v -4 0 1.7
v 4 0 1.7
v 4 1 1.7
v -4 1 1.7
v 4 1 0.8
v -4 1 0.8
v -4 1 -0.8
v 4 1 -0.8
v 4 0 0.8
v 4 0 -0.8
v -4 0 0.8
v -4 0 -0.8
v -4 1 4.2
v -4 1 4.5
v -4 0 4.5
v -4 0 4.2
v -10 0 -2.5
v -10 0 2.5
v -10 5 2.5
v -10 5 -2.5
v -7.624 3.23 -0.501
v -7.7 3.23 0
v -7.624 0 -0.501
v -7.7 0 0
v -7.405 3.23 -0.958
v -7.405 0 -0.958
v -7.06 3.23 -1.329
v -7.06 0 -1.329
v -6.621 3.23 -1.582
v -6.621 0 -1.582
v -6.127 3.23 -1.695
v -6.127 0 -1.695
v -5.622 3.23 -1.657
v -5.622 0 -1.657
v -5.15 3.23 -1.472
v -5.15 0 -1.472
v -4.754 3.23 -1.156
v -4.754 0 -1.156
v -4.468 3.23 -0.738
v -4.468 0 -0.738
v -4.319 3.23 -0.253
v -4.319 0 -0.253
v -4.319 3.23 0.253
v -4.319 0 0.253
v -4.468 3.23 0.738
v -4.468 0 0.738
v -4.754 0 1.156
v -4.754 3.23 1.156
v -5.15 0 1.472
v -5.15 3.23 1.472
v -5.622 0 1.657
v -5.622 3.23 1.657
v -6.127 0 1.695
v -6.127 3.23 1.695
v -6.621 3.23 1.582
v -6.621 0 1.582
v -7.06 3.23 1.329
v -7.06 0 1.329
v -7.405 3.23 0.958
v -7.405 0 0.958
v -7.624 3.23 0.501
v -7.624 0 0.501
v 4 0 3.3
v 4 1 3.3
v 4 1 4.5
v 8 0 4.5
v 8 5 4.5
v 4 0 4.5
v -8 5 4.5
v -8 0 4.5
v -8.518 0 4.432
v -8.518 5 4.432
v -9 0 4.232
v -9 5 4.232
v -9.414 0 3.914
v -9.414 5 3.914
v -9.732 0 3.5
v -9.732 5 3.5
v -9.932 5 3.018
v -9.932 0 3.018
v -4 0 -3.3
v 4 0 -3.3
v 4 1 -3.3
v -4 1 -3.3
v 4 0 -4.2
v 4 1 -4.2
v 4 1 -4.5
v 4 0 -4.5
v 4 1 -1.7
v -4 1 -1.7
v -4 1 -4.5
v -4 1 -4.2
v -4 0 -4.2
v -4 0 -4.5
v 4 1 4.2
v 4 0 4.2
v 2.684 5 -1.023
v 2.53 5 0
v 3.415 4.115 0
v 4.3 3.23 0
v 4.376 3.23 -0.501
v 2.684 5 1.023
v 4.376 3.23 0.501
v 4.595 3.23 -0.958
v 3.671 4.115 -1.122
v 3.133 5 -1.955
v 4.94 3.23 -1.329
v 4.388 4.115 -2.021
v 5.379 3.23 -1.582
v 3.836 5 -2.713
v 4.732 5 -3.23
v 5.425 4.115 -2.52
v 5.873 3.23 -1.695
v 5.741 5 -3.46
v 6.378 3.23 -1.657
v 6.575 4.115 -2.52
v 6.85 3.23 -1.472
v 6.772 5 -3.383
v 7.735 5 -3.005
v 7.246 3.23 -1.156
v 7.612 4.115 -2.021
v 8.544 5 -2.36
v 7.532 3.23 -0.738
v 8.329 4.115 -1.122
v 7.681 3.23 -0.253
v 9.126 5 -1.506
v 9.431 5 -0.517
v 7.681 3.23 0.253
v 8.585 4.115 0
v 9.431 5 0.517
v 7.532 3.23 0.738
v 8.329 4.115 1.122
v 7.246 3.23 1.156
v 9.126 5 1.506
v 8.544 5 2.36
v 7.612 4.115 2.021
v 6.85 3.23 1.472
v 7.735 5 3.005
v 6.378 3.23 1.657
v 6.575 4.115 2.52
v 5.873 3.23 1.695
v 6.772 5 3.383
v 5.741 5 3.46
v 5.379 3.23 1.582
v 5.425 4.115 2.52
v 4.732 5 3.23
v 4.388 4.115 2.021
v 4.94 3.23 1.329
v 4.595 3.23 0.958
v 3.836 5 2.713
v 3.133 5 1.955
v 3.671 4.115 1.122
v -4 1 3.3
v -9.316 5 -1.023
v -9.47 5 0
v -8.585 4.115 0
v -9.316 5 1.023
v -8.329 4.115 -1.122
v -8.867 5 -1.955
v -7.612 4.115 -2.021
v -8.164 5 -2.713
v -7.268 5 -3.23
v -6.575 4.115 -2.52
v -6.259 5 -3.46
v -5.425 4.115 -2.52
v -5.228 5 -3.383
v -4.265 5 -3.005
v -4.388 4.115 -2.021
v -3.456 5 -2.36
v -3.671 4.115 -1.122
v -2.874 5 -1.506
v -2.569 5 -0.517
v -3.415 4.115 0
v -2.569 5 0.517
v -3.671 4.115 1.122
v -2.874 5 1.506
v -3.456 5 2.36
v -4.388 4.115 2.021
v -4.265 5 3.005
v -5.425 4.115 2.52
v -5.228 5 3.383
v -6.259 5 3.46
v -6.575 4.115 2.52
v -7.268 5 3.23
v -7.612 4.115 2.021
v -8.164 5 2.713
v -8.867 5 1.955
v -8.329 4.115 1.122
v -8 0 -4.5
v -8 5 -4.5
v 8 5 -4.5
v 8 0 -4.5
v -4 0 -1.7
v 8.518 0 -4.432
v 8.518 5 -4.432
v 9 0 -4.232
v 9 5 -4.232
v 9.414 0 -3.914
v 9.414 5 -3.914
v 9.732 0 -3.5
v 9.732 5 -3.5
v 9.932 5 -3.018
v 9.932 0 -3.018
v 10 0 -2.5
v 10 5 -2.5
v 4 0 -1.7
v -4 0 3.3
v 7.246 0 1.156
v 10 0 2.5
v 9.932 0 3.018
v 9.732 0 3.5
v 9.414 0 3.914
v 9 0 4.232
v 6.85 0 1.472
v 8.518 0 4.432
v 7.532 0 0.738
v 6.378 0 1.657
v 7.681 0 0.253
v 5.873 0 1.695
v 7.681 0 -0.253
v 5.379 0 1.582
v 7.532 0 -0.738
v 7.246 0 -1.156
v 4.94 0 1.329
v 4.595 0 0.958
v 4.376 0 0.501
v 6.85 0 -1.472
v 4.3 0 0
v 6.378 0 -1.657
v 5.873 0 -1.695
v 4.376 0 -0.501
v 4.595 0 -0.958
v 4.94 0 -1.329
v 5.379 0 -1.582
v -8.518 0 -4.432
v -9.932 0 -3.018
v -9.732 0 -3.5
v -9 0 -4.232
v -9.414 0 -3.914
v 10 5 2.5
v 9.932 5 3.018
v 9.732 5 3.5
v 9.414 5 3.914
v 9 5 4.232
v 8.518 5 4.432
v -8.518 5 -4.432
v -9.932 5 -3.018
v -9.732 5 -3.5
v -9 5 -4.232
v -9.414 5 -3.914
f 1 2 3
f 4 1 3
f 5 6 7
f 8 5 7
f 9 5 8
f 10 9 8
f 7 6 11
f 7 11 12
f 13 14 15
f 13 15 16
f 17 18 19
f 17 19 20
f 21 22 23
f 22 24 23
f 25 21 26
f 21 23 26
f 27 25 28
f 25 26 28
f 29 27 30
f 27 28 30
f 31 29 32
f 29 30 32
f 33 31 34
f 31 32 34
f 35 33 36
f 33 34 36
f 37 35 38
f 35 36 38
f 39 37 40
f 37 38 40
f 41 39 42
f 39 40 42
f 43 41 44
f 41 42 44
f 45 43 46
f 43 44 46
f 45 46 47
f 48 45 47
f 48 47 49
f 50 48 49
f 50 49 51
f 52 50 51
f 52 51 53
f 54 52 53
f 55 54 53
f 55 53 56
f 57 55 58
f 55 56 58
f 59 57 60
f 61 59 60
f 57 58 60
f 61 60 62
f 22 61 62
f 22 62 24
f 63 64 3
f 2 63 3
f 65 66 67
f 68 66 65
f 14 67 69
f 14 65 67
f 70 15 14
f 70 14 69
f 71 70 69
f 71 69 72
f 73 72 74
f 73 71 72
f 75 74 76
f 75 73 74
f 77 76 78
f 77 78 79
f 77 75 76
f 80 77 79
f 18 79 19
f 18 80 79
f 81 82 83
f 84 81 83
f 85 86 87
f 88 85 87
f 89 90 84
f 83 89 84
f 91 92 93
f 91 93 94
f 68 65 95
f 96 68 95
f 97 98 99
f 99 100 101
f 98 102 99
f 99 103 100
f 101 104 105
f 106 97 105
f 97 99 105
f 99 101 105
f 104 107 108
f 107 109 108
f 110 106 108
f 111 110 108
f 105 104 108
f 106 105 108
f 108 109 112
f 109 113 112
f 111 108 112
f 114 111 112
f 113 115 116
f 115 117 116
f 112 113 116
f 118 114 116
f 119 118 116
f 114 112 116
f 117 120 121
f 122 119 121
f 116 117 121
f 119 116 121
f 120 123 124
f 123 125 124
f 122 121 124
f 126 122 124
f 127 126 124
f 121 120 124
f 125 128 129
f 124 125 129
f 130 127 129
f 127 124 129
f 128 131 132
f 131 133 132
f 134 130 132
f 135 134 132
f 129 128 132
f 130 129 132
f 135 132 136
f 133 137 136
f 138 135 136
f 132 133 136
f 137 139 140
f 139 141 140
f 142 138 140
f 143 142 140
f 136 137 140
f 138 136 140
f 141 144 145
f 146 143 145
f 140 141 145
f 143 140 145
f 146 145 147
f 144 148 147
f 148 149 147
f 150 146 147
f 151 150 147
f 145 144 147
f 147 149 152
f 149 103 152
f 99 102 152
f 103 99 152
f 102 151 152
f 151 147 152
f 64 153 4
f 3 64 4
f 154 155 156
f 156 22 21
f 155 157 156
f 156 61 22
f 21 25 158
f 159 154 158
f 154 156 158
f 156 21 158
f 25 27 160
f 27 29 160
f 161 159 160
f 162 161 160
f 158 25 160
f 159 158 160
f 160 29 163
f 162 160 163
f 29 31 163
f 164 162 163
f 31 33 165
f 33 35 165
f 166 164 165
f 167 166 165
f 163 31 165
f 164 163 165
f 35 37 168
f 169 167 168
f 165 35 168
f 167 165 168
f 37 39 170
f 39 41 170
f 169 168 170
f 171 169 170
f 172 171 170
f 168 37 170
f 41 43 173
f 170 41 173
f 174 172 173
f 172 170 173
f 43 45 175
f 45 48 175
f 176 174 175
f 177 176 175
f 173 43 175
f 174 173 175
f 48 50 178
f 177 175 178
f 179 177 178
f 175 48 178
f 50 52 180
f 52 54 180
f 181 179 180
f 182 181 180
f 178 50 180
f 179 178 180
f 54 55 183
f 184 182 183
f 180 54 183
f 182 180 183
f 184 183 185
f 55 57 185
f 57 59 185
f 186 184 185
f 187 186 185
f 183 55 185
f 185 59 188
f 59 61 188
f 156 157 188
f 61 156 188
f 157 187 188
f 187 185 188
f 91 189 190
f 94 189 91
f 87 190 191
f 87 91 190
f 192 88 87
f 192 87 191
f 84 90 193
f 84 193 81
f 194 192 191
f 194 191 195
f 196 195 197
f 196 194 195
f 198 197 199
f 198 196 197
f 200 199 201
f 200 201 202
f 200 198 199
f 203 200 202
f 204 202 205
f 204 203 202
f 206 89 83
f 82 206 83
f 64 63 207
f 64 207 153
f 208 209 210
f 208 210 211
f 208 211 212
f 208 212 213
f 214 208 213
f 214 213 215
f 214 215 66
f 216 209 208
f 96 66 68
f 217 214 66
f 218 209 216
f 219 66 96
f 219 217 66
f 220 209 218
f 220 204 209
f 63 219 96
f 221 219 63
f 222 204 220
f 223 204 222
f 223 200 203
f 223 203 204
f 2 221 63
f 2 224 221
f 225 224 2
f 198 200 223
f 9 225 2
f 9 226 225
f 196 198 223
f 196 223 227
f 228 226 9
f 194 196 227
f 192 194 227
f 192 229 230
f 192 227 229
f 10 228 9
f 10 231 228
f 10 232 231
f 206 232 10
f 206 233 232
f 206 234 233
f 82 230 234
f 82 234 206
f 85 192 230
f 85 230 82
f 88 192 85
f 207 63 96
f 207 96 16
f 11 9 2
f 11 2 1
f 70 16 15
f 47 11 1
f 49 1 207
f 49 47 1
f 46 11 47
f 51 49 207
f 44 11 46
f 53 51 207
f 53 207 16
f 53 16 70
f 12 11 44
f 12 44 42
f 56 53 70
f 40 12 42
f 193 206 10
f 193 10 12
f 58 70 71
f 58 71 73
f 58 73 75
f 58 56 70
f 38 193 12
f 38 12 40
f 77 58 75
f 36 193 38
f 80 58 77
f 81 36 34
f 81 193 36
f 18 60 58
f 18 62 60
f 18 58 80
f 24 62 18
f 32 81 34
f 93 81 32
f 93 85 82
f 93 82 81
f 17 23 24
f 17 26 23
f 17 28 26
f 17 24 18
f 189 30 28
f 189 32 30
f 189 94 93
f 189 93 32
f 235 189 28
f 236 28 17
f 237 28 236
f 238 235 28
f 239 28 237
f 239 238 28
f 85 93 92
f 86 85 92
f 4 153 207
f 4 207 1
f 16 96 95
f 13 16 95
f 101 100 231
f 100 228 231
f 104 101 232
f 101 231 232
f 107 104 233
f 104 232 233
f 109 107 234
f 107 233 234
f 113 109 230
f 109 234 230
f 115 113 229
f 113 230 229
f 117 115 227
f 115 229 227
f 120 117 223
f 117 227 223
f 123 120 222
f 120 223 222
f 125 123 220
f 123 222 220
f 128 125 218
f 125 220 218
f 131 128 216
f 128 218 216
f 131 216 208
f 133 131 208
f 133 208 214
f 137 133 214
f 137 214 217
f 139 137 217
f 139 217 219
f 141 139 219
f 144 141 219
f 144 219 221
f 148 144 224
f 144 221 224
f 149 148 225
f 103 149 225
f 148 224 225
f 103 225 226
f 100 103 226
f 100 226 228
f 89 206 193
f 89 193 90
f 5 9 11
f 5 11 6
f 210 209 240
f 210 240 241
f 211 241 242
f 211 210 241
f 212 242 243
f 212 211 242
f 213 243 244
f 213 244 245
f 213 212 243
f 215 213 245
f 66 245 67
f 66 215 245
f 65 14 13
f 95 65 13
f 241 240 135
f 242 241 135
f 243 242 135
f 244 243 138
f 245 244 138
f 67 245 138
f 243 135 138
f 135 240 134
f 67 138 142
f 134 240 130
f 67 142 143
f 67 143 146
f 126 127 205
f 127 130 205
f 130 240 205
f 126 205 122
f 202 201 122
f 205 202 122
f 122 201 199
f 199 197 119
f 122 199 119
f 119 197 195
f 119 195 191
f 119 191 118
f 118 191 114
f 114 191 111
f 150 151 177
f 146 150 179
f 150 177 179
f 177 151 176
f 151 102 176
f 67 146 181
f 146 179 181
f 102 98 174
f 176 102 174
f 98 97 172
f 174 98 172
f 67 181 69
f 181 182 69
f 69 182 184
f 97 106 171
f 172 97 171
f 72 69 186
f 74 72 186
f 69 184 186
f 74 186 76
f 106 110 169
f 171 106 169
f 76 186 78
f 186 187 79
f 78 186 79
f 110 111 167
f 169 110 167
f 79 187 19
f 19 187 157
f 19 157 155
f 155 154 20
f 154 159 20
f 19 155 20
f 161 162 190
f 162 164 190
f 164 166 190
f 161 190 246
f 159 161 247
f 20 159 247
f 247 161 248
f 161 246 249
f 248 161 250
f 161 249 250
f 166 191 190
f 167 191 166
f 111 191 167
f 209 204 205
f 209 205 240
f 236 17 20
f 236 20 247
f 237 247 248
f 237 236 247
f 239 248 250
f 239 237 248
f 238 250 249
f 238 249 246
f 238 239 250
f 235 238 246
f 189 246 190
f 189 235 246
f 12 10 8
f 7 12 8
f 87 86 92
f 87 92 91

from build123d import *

# Parameters (mm, degrees)
BOSS_EXTRUDE1_DEPTH                                  = 5
CSK_FOR_M3_HEX_SOCKET_COUNTERSUNK_HEAD_S_D           = 3.4
CSK_FOR_M3_HEX_SOCKET_COUNTERSUNK_HEAD_S_CSINK_D     = 6.94
CSK_FOR_M3_HEX_SOCKET_COUNTERSUNK_HEAD_S_CSINK_ANGLE = 90
SKETCH5_W                                            = 1.6
SKETCH5_H                                            = 1
CUT_EXTRUDE1_DEPTH                                   = 4


with BuildPart() as part:
    # Sketch1 → Boss-Extrude1 (new body)
    with BuildSketch(Plane(origin=(0, 0, 0), x_dir=(1, 0, 0), z_dir=(0, 1, 0))):
        with BuildLine():
            Line((-8, 4.5), (8, 4.5))
            ThreePointArc((8, 4.5), (9.414213562, 3.914213562), (10, 2.5))
            Line((10, 2.5), (10, -2.5))
            ThreePointArc((10, -2.5), (9.414213562, -3.914213562), (8, -4.5))
            Line((8, -4.5), (-8, -4.5))
            ThreePointArc((-8, -4.5), (-9.414213562, -3.914213562), (-10, -2.5))
            Line((-10, -2.5), (-10, 2.5))
            ThreePointArc((-10, 2.5), (-9.414213562, 3.914213562), (-8, 4.5))
        make_face()
    extrude(amount=BOSS_EXTRUDE1_DEPTH)

    # CSK for M3 Hex Socket Countersunk Head Screw1 (through all)
    with Locations(Plane(origin=(0, 5, 0), x_dir=(1, 0, 0), z_dir=(0, 1, 0))):
        with Locations((-6, 0), (6, 0)):
            CounterSinkHole(CSK_FOR_M3_HEX_SOCKET_COUNTERSUNK_HEAD_S_D / 2, CSK_FOR_M3_HEX_SOCKET_COUNTERSUNK_HEAD_S_CSINK_D / 2, counter_sink_angle=CSK_FOR_M3_HEX_SOCKET_COUNTERSUNK_HEAD_S_CSINK_ANGLE)

    # Sketch5 → Cut-Extrude1 (cut, symmetric)
    with BuildSketch(Plane(origin=(0, 0, 0), x_dir=(0, 0, -1), z_dir=(1, 0, 0))):
        with Locations((2.5, 0.5)):
            Rectangle(SKETCH5_W, SKETCH5_H)
        with Locations((-5, 0.5)):
            Rectangle(SKETCH5_W, SKETCH5_H)
        with Locations((-2.5, 0.5)):
            Rectangle(SKETCH5_W, SKETCH5_H)
        with Locations((0, 0.5)):
            Rectangle(SKETCH5_W, SKETCH5_H)
        with Locations((5, 0.5)):
            Rectangle(SKETCH5_W, SKETCH5_H)
    extrude(amount=CUT_EXTRUDE1_DEPTH, both=True, mode=Mode.SUBTRACT)


solid = part.part
